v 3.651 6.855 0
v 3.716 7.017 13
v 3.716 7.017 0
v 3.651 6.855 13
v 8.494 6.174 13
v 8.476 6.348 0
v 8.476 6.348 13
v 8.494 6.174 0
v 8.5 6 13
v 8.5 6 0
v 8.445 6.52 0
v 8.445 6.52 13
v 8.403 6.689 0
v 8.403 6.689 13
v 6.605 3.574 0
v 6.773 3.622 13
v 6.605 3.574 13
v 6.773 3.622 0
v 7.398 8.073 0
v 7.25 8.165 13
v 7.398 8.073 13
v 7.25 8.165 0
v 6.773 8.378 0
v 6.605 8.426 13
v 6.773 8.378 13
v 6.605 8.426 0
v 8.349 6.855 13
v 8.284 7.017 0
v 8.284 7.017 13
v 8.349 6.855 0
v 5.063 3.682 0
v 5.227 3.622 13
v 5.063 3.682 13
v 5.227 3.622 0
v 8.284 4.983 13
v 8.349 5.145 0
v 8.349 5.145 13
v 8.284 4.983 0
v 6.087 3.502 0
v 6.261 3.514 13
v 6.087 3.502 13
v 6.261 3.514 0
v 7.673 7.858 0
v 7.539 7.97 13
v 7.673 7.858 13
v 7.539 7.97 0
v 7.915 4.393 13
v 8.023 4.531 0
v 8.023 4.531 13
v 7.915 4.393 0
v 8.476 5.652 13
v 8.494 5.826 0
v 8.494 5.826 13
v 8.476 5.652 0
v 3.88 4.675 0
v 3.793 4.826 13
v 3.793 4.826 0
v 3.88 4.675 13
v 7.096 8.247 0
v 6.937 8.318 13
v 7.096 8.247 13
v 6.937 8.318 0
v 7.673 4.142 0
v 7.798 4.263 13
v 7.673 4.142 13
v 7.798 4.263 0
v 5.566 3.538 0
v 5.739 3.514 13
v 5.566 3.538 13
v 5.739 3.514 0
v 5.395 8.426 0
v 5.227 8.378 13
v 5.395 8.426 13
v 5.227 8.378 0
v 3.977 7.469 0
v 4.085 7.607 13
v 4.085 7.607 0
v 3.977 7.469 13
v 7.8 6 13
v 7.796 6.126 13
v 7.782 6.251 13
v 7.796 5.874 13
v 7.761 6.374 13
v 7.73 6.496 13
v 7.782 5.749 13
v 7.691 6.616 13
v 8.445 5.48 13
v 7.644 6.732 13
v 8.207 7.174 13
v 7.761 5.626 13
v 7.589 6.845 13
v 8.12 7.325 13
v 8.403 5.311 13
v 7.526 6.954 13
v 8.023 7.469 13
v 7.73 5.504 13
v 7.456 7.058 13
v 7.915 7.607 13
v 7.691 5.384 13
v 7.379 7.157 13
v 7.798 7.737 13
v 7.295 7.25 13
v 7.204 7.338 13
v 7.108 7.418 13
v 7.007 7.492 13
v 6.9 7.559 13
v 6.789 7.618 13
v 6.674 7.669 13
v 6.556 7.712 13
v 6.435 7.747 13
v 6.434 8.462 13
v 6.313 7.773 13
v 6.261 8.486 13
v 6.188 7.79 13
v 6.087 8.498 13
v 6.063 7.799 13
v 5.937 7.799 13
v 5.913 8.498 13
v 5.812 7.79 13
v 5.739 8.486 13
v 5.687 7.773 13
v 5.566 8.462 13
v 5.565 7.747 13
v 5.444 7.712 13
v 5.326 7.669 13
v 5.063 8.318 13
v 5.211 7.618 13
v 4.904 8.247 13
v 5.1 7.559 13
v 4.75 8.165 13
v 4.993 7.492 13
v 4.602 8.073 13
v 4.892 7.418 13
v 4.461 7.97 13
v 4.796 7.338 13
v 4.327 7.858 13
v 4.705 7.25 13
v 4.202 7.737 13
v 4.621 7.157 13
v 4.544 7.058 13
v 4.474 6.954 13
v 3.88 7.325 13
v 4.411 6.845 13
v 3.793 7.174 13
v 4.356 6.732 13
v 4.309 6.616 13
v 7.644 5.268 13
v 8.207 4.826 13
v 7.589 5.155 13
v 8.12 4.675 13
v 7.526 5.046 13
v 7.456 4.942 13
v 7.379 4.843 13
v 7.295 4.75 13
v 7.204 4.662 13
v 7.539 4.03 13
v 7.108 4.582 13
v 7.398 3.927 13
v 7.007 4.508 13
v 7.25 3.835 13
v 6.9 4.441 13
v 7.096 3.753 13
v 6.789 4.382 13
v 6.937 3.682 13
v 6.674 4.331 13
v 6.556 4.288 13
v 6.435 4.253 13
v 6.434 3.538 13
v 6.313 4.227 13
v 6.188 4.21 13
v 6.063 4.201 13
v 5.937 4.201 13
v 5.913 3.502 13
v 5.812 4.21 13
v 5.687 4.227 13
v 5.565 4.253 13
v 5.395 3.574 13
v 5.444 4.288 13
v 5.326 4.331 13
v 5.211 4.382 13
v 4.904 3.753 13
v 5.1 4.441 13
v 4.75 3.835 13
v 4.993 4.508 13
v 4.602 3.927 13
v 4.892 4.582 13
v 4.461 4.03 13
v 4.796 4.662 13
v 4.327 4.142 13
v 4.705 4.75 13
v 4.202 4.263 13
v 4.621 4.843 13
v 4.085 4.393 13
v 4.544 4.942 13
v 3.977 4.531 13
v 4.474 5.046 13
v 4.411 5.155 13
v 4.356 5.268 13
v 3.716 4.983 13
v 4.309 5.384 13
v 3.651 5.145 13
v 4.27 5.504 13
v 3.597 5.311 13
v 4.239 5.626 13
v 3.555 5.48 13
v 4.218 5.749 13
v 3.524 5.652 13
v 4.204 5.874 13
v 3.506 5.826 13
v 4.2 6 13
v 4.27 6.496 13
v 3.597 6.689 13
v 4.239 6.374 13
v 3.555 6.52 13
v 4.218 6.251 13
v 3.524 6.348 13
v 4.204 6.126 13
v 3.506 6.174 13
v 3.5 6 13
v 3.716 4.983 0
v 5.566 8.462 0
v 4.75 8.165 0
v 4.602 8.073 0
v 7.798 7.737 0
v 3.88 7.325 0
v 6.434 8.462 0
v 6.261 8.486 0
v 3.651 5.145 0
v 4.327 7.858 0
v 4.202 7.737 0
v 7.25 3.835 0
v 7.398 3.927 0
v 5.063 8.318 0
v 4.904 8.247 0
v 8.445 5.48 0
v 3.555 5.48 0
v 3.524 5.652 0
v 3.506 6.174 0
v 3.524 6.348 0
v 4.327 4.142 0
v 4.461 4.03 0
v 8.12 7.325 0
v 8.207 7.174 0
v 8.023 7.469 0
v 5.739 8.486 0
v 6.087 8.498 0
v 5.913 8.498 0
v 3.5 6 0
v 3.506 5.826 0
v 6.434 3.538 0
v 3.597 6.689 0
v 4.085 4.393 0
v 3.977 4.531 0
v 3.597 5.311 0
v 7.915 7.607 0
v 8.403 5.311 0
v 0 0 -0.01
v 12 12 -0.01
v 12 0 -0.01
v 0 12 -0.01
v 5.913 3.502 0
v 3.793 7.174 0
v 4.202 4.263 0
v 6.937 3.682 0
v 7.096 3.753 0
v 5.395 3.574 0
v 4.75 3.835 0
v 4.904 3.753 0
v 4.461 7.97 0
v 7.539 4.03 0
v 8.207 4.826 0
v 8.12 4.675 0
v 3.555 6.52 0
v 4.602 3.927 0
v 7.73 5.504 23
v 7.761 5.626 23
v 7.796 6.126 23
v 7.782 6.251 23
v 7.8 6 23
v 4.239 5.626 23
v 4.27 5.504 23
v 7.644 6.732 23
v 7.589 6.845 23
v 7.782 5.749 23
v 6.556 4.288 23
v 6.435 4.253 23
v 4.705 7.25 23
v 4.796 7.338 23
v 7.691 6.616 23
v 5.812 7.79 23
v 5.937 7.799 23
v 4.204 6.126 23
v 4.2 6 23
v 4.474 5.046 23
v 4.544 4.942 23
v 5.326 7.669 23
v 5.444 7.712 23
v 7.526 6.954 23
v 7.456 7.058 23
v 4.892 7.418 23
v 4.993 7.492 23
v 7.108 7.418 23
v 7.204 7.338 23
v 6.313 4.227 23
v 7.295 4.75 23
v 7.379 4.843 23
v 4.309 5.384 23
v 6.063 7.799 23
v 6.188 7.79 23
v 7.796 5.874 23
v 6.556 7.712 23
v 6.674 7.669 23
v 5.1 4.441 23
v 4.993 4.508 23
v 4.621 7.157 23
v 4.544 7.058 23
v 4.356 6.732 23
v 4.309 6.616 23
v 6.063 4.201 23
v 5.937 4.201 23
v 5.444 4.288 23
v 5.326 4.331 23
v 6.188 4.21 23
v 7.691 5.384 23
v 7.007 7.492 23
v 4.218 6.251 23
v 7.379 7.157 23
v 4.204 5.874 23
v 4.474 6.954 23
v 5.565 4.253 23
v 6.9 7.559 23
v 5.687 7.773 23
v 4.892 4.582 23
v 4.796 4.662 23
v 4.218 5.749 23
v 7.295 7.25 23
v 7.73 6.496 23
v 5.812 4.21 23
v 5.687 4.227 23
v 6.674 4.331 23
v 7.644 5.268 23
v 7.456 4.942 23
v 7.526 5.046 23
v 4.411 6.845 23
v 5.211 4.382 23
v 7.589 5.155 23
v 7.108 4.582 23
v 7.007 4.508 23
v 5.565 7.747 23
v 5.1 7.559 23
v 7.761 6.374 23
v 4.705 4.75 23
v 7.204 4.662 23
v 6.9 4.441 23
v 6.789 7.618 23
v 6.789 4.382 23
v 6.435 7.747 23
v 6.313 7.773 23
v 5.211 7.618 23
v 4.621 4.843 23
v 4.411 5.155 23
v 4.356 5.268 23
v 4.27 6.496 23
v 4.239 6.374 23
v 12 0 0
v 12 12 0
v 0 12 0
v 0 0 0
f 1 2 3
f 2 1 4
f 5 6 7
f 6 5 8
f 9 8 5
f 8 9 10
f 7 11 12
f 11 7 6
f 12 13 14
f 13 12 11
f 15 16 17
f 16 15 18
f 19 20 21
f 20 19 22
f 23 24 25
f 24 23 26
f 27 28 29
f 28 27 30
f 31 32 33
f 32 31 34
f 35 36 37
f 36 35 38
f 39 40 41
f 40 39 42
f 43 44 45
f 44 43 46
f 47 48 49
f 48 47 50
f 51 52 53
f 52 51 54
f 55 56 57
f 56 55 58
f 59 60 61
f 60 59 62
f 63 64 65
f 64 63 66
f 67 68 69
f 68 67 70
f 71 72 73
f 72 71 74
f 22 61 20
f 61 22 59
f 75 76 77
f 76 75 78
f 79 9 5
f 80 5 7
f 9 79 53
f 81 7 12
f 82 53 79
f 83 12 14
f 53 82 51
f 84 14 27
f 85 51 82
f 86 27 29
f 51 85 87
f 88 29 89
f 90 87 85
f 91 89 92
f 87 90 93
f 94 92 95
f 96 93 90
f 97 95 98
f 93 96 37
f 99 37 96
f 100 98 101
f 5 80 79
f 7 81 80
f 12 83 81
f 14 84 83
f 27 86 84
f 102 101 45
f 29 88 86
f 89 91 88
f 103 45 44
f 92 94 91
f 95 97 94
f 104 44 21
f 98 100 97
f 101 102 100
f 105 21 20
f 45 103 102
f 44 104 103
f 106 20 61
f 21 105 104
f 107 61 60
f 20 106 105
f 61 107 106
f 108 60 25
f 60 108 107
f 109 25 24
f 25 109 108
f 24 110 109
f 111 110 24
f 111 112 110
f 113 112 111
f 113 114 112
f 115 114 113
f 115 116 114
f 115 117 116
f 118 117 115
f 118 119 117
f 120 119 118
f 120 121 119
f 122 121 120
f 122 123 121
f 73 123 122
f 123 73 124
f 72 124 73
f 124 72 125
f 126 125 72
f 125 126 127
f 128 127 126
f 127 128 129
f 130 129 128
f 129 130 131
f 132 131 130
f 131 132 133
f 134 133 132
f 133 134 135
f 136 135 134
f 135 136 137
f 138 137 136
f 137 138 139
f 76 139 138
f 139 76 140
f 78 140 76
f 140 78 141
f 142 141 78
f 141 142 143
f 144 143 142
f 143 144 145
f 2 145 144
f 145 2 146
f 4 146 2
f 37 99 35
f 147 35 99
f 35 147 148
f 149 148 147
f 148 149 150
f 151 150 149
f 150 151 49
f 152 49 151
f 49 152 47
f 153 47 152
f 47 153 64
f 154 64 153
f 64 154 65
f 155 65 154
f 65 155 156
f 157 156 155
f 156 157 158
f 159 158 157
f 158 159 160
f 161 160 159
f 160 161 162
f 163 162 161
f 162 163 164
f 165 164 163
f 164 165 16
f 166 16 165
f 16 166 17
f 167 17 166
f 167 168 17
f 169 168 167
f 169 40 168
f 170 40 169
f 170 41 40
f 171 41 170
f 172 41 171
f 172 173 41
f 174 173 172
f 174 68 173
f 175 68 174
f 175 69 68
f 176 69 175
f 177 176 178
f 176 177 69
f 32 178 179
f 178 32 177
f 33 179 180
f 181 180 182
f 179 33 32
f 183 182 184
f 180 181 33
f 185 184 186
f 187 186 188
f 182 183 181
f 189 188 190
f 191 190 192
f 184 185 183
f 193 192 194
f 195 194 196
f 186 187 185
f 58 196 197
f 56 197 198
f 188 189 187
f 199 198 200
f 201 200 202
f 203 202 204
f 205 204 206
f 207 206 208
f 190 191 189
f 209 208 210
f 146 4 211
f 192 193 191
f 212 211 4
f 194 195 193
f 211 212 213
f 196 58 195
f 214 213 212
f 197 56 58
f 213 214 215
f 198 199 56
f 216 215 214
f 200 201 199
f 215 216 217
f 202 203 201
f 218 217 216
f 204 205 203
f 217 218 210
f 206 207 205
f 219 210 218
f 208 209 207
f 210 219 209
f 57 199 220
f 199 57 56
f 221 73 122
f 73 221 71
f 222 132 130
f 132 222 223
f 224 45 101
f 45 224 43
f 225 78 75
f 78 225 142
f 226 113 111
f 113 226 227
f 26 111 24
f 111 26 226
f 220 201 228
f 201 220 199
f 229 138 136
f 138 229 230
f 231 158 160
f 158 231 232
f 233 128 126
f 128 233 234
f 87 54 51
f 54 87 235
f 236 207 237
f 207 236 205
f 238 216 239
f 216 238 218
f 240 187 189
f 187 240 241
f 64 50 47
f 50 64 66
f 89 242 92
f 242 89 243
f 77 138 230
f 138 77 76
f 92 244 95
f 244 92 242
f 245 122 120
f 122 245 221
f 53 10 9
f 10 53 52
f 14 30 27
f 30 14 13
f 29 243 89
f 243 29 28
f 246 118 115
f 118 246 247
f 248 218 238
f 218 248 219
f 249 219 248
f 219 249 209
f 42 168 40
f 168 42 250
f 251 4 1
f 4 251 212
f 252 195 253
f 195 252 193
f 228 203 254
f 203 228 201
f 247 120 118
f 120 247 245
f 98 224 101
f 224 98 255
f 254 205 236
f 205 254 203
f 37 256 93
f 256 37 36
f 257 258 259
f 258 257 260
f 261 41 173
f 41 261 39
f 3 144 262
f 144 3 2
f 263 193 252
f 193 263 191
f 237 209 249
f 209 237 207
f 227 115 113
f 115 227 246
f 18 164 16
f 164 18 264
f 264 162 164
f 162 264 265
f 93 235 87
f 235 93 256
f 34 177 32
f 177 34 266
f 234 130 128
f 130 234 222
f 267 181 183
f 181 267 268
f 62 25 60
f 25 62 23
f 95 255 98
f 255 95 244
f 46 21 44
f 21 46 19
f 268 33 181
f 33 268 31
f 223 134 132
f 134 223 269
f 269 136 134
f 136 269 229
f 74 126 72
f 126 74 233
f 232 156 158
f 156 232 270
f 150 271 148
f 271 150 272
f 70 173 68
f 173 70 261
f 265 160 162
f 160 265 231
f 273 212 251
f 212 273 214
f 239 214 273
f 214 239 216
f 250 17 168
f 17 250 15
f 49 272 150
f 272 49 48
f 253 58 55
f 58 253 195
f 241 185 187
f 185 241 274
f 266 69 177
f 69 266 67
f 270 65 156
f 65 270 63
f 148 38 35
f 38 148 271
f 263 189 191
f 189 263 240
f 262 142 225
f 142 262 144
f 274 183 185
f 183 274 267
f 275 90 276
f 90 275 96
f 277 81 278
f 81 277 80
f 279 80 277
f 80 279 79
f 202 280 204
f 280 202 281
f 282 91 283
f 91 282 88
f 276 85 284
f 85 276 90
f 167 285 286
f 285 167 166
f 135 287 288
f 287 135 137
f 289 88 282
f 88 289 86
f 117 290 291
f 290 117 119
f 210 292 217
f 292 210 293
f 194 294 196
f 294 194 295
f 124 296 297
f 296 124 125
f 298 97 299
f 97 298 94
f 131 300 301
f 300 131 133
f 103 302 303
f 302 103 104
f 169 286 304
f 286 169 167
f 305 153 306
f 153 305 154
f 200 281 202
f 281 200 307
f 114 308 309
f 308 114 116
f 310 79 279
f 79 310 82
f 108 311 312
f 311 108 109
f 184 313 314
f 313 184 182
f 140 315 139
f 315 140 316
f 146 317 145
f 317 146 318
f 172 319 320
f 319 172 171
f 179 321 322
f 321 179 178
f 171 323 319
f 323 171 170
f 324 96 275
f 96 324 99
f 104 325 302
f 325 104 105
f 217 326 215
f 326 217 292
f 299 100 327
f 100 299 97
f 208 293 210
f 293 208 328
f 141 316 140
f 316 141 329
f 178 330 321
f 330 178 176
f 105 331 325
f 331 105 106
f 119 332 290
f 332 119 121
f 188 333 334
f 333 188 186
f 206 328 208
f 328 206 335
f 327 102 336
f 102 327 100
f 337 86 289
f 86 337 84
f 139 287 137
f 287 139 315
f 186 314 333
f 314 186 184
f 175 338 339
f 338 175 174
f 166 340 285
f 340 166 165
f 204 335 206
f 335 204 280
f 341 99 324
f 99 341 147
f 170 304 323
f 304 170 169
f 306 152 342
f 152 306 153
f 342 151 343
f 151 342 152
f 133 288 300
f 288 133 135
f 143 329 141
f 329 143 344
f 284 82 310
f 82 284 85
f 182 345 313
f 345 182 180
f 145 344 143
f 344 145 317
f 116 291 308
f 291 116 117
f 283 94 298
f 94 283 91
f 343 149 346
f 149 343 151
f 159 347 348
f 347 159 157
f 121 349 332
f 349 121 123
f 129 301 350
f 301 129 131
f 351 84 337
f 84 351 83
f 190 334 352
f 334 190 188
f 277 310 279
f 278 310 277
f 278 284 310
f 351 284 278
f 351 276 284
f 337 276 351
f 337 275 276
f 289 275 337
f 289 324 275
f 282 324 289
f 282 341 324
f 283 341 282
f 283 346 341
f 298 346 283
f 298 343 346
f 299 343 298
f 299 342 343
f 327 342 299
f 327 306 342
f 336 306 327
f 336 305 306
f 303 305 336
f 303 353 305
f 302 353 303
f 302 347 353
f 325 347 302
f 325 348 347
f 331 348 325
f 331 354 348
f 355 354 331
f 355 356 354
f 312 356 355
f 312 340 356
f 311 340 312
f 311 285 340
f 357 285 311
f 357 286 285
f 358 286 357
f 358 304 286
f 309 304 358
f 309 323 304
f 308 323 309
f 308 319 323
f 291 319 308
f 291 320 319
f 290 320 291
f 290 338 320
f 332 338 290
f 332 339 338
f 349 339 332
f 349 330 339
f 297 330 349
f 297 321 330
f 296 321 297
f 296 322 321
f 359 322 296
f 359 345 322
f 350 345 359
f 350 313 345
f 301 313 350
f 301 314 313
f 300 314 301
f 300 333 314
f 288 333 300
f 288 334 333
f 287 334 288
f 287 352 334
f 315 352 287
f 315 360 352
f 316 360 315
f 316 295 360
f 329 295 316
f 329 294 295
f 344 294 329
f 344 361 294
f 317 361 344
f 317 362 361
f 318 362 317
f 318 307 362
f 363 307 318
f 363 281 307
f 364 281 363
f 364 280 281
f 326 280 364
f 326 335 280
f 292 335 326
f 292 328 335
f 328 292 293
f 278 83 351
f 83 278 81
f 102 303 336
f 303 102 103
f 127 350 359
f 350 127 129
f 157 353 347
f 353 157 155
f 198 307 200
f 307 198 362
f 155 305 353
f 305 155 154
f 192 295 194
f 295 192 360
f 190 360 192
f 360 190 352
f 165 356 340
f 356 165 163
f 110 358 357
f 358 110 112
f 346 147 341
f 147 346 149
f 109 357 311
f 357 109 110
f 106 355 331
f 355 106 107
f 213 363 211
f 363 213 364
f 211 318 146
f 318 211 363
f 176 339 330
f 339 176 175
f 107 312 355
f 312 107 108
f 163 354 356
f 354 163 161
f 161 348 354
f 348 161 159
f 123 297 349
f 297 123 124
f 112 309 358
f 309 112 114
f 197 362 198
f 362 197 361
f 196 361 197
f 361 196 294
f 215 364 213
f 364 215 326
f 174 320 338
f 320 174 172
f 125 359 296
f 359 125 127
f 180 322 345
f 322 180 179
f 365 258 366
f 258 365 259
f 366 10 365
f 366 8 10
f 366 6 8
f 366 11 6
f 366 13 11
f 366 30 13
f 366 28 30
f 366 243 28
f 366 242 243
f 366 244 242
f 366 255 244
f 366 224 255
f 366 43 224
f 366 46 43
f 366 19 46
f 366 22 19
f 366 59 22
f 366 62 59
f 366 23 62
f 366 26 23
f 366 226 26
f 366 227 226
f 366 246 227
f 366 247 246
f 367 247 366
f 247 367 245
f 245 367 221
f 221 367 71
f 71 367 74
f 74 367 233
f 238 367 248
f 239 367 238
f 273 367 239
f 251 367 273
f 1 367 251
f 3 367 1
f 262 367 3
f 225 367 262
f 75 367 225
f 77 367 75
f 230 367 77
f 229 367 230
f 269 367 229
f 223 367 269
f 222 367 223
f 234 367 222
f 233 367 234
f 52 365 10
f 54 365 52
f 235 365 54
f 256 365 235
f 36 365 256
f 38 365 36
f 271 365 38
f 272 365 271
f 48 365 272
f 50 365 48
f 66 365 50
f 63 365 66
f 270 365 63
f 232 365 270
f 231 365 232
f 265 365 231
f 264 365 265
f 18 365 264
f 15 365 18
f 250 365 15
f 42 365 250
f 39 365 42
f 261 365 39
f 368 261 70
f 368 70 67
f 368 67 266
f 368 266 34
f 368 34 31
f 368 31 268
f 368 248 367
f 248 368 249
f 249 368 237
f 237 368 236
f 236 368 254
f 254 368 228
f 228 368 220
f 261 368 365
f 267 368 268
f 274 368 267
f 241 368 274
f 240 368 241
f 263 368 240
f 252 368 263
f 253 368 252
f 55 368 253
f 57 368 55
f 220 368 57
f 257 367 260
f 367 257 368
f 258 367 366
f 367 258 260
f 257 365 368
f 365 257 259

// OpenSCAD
// file: ../Base/Rotation.scad
// Fischertechnik Box Foundation
// Geometry Helpers Rotation

include <PlacementOptions.scad>

// getRotatedSpace(space, rotation=NoRotation)
// Rotates the space dependent on the specified rotation

function getRotatedSpace(space, rotation=NoRotation) = [
    (rotation == Rotate90 || rotation == Rotate270) ? space.y : space.x,
    (rotation == Rotate90 || rotation == Rotate270) ? space.x : space.y
];

// Rotates the given space around the fixed left lower corner
// space = the space the children needs as width/depth list [width,depth]
// rotation = 0 Rotate0 degrees, 1 Rotate90 degrees, 2 Rotate180 degrees, 3 Rotate270 degrees (equivalent to -90)

module RotateFix(space, rotation=NoRotation) {
    dy = (rotation == Rotate0 || rotation == Rotate270) ? 0 :
        (rotation == Rotate90) ? space.x :
        space.y;
    dx = (rotation < Rotate180) ? 0 :
        (rotation == Rotate180) ? space.x :
        space.y;
    
    translate([dx, dy, 0])
        rotate([0, 0, rotations[rotation]])
            children();
}
// file: ../Base/Alignment.scad
// Fischertechnik Box Foundation
// Geometry Helpers Alignment

include <PlacementOptions.scad>

// getAlignedX(elementWidth, spaceWidth, align=AlignRight, offset=0)
// Gets the aligned X offset of an element with the given
// width in the given space.
// elementWidth = The width of the element to positon
// spaceWidth = The space where the element should be aligned
// align = 0 AlignLeft, 1 AlignCenter, 2 AlignRight
// offset = an optional offset from the aligned position. When
// aligned left or centered, then positive values are in X direction.
// When aligned right then positive values are in negative X direction.

function getAlignedX(elementWidth, spaceWidth, align=AlignRight, offset=0) =
    (align == AlignLeft) ?
        offset :
        ((align == AlignCenter) ?
        (spaceWidth - elementWidth)/2 + offset :
        spaceWidth - offset - elementWidth);

// getAlignedY(elementDepth, spaceDepth, align=AlignTop, offset=0)
// Gets the aligned Y offset of an element with the given
// depth in the given space.
// elementDepth = The depth of the element to positon
// spaceDepth = The space where the element should be aligned
// align = 0 AlignBottom, 1 AlignCenter, 2 AlignTop
// offset = an optional offset from the aligned position. When
// aligned bottom or centered, then positive values are in Y direction.
// When aligned top then positive values are in negative Y direction.

function getAlignedY(elementDepth, spaceDepth, align=AlignTop, offset=0) =
    (align == AlignBottom) ?
        offset :
        ((align == AlignCenter) ?
        (spaceDepth - elementDepth)/2 + offset :
        spaceDepth - offset - elementDepth);
// file: ../Base/PlacementOptions.scad
// Fischertechnik Box Foundation
// Placement Options

// Alignment
NoAlign = 0;
AlignLeft = 1;
AlignBottom = 2;
AlignCenter = 3;
AlignRight = 4;
AlignTop = 5;

// Element rotation degree steps
rotations = [0, -90, -180, -270];

// Rotation
NoRotation = 0;
Rotate0 = 0;
Rotate90 = 1;
Rotate180 = 2;
Rotate270 = 3;

// Docking (seen from above)
NoDock = -1;
DockLeft = 0;
DockTop = 1;
DockRight = 2;
DockCorner = 2;
DockBottom = 3;

// Web corners
LowerLeft = 0;
UpperLeft = 1;
UpperRight = 2;
LowerRight = 3;

// Web position relative to corner
LeftOfCorner = 0;
RightOfCorner = 1;
// file: ../Base/Boxes.scad
// Fischertechnik Box Foundation
// Pre-designed Boxes

use <Constants.scad>

include <PlacementOptions.scad>

box190Width = 190;
box190Depth = 130;
box130Width = 130;
box130Depth = 95;

// Values are from an original ec3 box
topBottomDifference = 1.5;
outerHeight = 40;
innerHeight = 38.2;
baseThickness = outerHeight - innerHeight;
stackExcess = 5.7;
radius = 3.5;
wallThickness = 1.5;
tolerance = 0.2;
stackOffset = innerHeight - stackExcess;

boxUsageHeight = stackOffset;
boxWallThickness = wallThickness;
boxBaseThickness = baseThickness;
boxWebWidth = 3.0;

// getBoxWallThickness()
// Gets the wall thickness of a Fischertechnik Box
function getBoxWallThickness() = boxWallThickness;

// getBoxUsageHeight()
// Gets the usable height of a Fischertechnik box
function getBoxUsageHeight() = boxUsageHeight;

// getBoxInnerHeight()
// Gets the inner height of a Fischertechnik box, including the stack excess
function getBoxInnerHeight() = innerHeight;

// getBoxBaseThickness()
// Gets the thickness of the Fischertechnik box base.
function getBoxBaseThickness() = boxBaseThickness;

// getBoxWebWidth()
// Gets the width of a box web
function getBoxWebWidth() = boxWebWidth;

// getBox190Space()
// Gets the usable inner space of a Box 190 as an x/y-list
function getBox190Space() = [
    box190Width - 2*getBoxWallThickness() - topBottomDifference, 
    box190Depth - 2*getBoxWallThickness() - topBottomDifference ];

// BoxBase(width, depth)
// Creates an empty stackable Fischertechnik compatible box
// width = Outer width of the box (190, 130, ...)
// depth = Outer depth of the box (130, 95, ...)

module BoxBase(width, depth, height=outerHeight) {    
    thinPlate = 0.01;

    innerHeight = height - baseThickness;    
    
    module BodyPlate(width, depth) {
        translate([radius, radius])
        hull() {
            w = width-2*radius;
            d = depth-2*radius;
            cube([w, d, thinPlate]);
            cylinder(thinPlate, r=radius, $fn=getFragments());
            translate([w, 0])
                cylinder(thinPlate, r=radius, $fn=getFragments());
            translate([w, d])
                cylinder(thinPlate, r=radius, $fn=getFragments());
            translate([0, d])
                cylinder(thinPlate, r=radius, $fn=getFragments());
        }
    }
    
    module Body(tolerance=tolerance) {
        hull() {
            // Bottom with tolerance to fit into the original boxes when stacked
            translate([-wallThickness+tolerance, -wallThickness+tolerance, -baseThickness])
                BodyPlate(width-topBottomDifference-2*tolerance, depth-topBottomDifference-2*tolerance);
            
            // Top
            translate([-wallThickness-topBottomDifference/2, -wallThickness-topBottomDifference/2, innerHeight-thinPlate])
                BodyPlate(width, depth);
         }
    }

    module Cutoff() {
        hull() {
            coWidth = width - 2*wallThickness;
            coDepth = depth - 2*wallThickness;
            
            // Bottom
            BodyPlate(coWidth-topBottomDifference, coDepth-topBottomDifference);

            // Top
            translate([-topBottomDifference/2, -topBottomDifference/2, innerHeight+thinPlate]) 
                BodyPlate(coWidth, coDepth);
        }
    }
    
    difference() {        
        Body();
        Cutoff();
        stackOffset = innerHeight - stackExcess;
        translate([0, 0, stackOffset + baseThickness])
            Body(tolerance=0);
    }
}

// Creates the Fischertechnik empty box 130x190 mm and places it at position 0,0
// 190x130 are the outer sizes, the inner space is slightly smaller. Use getBox190Space() to get the inner sizes.
// The box is positioned that the usable inner space is at the 0,0,0 position. The

module Box190() {
    BoxBase(box190Width, box190Depth);
}

// Gets the usable inner space of a Box 130 as an x/y-list
function getBox130Space() = [
    box130Width - 2*getBoxWallThickness() - topBottomDifference, 
    box130Depth - 2*getBoxWallThickness() - topBottomDifference ];

// Creates the Fischertechnik empty box 95x130 mm and places it at position 0,0
// 190x130 are the outer sizes, the inner space is slightly smaller. Use getBox190Space() to get the inner sizes.
// The box is positioned that the usable inner space is at the 0,0,0 position. The

module Box130() {
    BoxBase(box130Width, box130Depth);
}

// Creates a web at the specified box walls
// corner 0 = LowerLeft, 1 = UpperLeft, 2 = UpperRight, 3 = LowerRight
// side 0 = LeftOfCorner, 1 = RightOfCorner
// distance = Distance in mm from the corner
// boxSpace = inner width and depth of the box (default: Box 190)
// webWidth = length of the web (default is 3 mms)
// webThickness = thickness of the web (default is 1 mm)

module BoxWeb(corner, side, distance, boxSpace=getBox190Space(), webWidth=getBoxWebWidth(), webThickness=1.0) {
    sink = getBoxWallThickness()/2;

    width = (corner % 2 == 0) ? 
            (side == LeftOfCorner ? webWidth : webThickness) :
            (side == LeftOfCorner ? webThickness : webWidth);

    depth = (corner % 2 == 0) ? 
            (side == RightOfCorner ? webWidth : webThickness) :
            (side == RightOfCorner ? webThickness : webWidth);
    
    xDiff = corner == LowerLeft ? 
                (side == LeftOfCorner ? -sink : distance) :
            (corner == UpperLeft ?                
                (side == LeftOfCorner ? distance : -sink) :
            (corner == UpperRight ?
                (side == LeftOfCorner ? boxSpace.x-webWidth+sink : boxSpace.x-distance-webThickness) :
                (side == LeftOfCorner ? boxSpace.x-distance-webThickness: boxSpace.x-webWidth+sink)));

    yDiff = corner == LowerLeft ? 
                (side == RightOfCorner ? -sink : distance) :
            (corner == UpperLeft ?
                (side == RightOfCorner ? boxSpace.y-distance : boxSpace.y-webWidth+sink) :
            (corner == UpperRight ?
                (side == RightOfCorner ? boxSpace.y-webWidth+sink : boxSpace.y-distance) :
                (side == RightOfCorner ? distance : -sink)));
    
    translate([xDiff, yDiff, -getExcess()])
        cube([width, depth, boxUsageHeight + 2*getExcess()]);
}
// file: ../Base/Placement.scad
// Fischertechnik Box Foundation
// Geometry Helpers Placement

use <Constants.scad>
use <Alignment.scad>
use <Rotation.scad>
use <Boxes.scad>

include <PlacementOptions.scad>

// Place(x=0, y=0, elementSpace=[0,0], alignX=AlignLeft, alignY=AlignBottom, rotation=Rotate0, boxSpace=getBox190Space())
// Places the child at the specified position
// y = Y-Position. This is a relative position when an X aligment is specified.
// x = X-Position. This is a relative position when an Y aligment is specified.
// elementSpace = space of the element to be placed [x,y]
// alignX = -1=NoAlign, 0 AlignLeft, 1 AlignCenter, 3 AlignRight (elementSpace and boxSpace required!)
// alignY = -1=NoAlign, 2 AlignBottom, 1 AlignCenter, 4 AlignTop (elementSpace and boxSpace required!)
// rotation = 0 Rotate0 0 degrees, 1 Rotate90 90 degrees, 
// 2 Rotate180 180 degrees, 3 Rotate270 270 degrees (equivalent to -90)
// boxSpace = Inner space of the box where the placement occurs [x,y] - default is Box 190x130 inner space

module Place(x=0, y=0, elementSpace=[0,0], 
  alignX=AlignLeft, alignY=AlignBottom, 
  rotation=NoRotation, boxSpace=getBox190Space()) {

    module Position(x, y, space, rotation=Rotate0) {
        translate([x, y, 0])
            RotateFix(space, rotation)
                children();
    }

    space = getRotatedSpace(elementSpace, rotation);
    alignedX = getAlignedX(space.x, boxSpace.x, alignX, x);
    alignedY = getAlignedY(space.y, boxSpace.y, alignY, y);
    Position(alignedX, alignedY, elementSpace, rotation)
        children();
}

// Center(space=getBox130Space(), elementSpace=[0,0])
// space = Space where the children is centered. For cylinder use centered=true and no elementSpace.
// elementSpace = space of the element to be centered [x,y]

module Center(space=getBox190Space(), elementSpace=[0,0]) {
    Place(elementSpace=elementSpace, boxSpace=space, alignX=AlignCenter, alignY=AlignCenter)
        children();
}

// CenterHorizontal(width=0, y=0, offset=0, space=getBox130Space())
// width = Width of the element to be placed.
// y = Y position of the element
// offset = Offset from the center position (negative will be left of the center)
// space = Space where the element is placed

module CenterHorizontal(width=0, y=0, offset=0, space=getBox190Space()) {
    Place(x=offset, y=y, elementSpace=[width, 0], boxSpace=space, alignX=AlignCenter)
        children(0);
}

// CenterVertical(depth=0, x=0, offset=0, space=getBox130Space())
// depth = Depth of the element to be placed.
// x = X position of the element
// offset = Offset from the center position (negative will be down of the center)
// space = Space where the element is placed

module CenterVertical(depth=0, x=0, offset=0, space=getBox190Space()) {
    Place(x=x, y=offset, elementSpace=[0, depth], boxSpace=space, alignY=AlignCenter)
        children(0);
}

// getIsVertical(align)
// True if the specified alignment needs a vertical orientation for a divider (AlignRight, AlignLeft)

function getIsVertical(align) = (align == AlignRight || align == AlignLeft);

// getIsHorizontal(align)
// True if the specified alignment needs a horizontal orientation for a divider (AlignTop, AlignBottom)

function getIsHorizontal(align) = (align == AlignTop || align == AlignBottom);
// file: ../Base/Constants.scad
// Fischertechnik Box Foundation
// Constants

// Constant values necessary for multiple elements

// Base constants
dividerThickness = 1.2;
excess = 0.01;
fragments = 90;
tolerance = 0.8;

// Gets the thickness of a divider 
function getDividerThickness() = dividerThickness;

// Gets the excess that is used to merge walls into each other
function getExcess() = excess;

// Gets amount of fragments of a cylinder
function getFragments() = fragments;

// Gets the inner tolerance of a frame to each side
function getTolerance() = tolerance;


// Fischertechnik specific constants
axisDiameter = 4;
axisBottomDiameter = axisDiameter + 1;
standardEdgeDistance = 2.5;
standardWebDistance = 11.5;
standardCornerLength = 15;
tubeWallFactor = 0.8;
smallPartsFrameHeight = 20;

// Gets axis diameter
function getAxisDiameter() = axisDiameter;

// Gets axis bottom diameter for thicker part at the bottom
function getAxisBottomDiameter() = axisBottomDiameter;

// gets the standard distance to the wall of the box for dockable frames with webs
function getStandardEdgeDistance() = standardEdgeDistance;

// gets the standard distance of each web to the corner of the dockable frame
function getStandardWebDistance() = standardWebDistance;

// gets the standard length of the corner walls of a dockable frame
function getStandardCornerLength() = standardCornerLength;

// gets the wall thickness of a tube.
function getTubeWallThickness() = tubeWallFactor * getDividerThickness();

// gets the frame height for docked small parts boxes.
function getSmallPartsFrameHeight() = smallPartsFrameHeight;
// main file
// Fischertechnik Box Library
// Axis for clip 10
// 31023

use <../ModelBase/Simple.scad>
use <../Base/Constants.scad>

/* [Element Parameters] */
height = 23;
clipHeight = 10;

/* [Hidden] */
width = 12;
depth = 12;
upperDiameter = 3.6;

// getAxisClip10Space()
// Gets the space of a frame for a clip 10 with spring ring (mot2)

function getAxisClip10Space() = [width, depth, height];

// AxisClip10(height, clipHeight)
// Axis for clip 10 with spring ring (mot2)
// height = Height of the complete axis
// clipHeight = Height of the part for the clip (standard is 10, in mot3 its only 7)

module AxisClip10(height=height, clipHeight=clipHeight) {
    LeveledAxisWithSpace(height, height-clipHeight, getAxisClip10Space(), diameter=upperDiameter);
}

// Test
color("lightgray")
AxisClip10(height, clipHeight);
